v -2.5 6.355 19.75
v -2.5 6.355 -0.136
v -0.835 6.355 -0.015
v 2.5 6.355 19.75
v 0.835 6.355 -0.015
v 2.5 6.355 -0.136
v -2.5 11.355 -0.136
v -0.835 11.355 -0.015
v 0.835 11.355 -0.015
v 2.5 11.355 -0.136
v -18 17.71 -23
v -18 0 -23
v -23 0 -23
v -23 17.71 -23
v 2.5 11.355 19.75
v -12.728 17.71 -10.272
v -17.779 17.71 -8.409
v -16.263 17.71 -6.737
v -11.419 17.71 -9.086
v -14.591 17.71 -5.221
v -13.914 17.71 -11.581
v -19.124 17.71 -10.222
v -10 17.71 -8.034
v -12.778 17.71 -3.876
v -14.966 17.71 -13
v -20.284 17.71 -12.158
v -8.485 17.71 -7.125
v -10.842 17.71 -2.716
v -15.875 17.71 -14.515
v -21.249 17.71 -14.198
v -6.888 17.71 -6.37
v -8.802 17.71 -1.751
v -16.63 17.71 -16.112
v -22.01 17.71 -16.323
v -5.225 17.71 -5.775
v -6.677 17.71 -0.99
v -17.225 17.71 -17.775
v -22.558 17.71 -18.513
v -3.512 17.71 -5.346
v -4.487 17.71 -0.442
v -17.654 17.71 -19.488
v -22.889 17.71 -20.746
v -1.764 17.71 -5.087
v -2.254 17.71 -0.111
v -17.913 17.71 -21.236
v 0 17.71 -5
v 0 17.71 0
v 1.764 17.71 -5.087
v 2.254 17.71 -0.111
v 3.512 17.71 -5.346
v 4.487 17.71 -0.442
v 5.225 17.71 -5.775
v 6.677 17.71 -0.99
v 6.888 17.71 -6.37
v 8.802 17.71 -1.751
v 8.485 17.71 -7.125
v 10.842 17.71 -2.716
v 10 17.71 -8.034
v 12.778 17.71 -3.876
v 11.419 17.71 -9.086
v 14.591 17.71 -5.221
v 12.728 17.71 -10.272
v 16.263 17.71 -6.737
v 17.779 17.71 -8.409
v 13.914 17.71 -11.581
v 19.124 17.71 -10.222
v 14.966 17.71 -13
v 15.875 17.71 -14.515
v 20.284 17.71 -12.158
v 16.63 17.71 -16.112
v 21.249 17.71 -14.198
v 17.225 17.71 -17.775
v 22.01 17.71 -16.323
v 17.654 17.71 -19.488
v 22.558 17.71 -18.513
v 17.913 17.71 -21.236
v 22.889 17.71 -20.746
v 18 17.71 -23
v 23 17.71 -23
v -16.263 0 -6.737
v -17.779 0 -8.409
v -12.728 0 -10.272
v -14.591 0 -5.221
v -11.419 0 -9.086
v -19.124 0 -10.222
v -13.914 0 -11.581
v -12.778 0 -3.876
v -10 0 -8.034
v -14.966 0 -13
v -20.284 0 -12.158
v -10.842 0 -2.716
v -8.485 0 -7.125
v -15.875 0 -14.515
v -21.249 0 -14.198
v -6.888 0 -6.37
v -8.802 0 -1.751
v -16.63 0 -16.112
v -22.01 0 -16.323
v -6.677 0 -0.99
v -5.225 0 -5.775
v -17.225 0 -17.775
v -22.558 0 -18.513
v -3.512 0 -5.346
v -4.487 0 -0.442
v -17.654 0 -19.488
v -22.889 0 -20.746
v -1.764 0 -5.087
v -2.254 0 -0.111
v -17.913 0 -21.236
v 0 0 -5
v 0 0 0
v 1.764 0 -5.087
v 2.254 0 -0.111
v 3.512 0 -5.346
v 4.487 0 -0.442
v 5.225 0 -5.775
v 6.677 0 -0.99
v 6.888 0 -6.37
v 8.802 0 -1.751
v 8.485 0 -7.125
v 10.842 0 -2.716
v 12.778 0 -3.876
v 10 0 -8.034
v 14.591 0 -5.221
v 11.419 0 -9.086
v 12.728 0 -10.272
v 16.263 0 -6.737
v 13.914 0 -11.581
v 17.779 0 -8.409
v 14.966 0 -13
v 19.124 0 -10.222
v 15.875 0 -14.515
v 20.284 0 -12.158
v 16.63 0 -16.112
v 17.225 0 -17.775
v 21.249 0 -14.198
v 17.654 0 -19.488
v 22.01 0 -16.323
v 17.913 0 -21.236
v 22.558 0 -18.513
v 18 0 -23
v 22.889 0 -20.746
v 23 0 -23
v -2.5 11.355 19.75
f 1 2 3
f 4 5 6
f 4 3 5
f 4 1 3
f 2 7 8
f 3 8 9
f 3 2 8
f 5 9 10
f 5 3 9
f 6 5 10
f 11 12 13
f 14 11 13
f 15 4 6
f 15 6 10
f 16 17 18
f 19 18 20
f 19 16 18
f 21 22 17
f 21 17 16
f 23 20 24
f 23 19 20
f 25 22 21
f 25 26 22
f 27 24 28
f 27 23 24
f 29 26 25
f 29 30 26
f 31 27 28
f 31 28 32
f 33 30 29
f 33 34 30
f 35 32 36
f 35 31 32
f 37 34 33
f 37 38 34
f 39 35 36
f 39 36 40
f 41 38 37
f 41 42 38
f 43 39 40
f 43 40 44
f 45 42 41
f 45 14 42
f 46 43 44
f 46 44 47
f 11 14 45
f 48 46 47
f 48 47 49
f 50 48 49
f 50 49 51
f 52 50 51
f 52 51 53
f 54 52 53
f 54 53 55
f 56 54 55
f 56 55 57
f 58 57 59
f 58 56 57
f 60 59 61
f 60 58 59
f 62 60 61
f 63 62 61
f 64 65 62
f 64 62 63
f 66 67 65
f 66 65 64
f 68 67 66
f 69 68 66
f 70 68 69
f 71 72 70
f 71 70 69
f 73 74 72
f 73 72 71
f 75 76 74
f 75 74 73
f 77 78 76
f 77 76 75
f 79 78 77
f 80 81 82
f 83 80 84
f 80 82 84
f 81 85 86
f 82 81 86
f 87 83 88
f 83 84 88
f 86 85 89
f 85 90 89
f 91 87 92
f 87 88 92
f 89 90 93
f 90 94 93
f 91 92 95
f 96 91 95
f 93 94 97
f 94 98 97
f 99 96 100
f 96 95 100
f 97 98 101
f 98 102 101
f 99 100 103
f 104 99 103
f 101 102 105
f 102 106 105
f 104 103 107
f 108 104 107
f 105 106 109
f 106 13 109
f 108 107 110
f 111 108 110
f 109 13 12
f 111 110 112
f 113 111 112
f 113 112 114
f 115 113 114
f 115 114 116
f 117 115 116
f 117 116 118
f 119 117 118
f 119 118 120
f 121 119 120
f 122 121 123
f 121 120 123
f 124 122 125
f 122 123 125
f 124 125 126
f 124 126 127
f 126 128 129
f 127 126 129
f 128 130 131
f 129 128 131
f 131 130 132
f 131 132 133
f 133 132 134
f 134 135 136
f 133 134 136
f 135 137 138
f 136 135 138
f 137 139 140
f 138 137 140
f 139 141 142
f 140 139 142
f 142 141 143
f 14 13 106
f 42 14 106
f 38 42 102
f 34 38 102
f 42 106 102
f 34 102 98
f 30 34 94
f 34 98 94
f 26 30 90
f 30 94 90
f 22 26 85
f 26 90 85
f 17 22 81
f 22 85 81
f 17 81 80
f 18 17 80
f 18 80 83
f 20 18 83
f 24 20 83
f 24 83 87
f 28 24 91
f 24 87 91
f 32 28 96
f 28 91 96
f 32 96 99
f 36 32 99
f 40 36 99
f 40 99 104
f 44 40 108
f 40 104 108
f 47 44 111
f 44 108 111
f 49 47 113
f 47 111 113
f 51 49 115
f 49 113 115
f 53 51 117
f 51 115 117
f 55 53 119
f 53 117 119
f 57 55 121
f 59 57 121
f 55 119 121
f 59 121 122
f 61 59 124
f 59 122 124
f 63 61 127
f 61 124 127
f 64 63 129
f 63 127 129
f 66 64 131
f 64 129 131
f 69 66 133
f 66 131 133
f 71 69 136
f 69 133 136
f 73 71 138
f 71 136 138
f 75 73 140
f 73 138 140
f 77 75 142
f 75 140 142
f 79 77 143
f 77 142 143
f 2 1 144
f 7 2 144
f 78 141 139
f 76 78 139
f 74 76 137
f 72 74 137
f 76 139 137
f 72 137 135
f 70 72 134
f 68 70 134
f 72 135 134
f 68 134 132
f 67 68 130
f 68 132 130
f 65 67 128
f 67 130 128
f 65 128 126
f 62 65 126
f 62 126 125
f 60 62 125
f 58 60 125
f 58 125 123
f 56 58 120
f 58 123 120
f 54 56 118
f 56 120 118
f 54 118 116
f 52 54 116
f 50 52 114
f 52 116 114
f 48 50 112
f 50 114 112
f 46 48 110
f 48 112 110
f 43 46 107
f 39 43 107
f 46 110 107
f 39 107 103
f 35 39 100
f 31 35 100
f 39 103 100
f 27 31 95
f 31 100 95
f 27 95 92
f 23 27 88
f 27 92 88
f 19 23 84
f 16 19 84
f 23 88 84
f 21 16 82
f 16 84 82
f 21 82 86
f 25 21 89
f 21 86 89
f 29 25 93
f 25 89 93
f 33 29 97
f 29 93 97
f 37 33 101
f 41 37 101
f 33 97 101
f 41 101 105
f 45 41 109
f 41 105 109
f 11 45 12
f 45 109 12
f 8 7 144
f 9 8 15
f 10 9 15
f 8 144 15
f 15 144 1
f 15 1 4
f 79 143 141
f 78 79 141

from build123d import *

# Parameters (mm, degrees)
BOSS_EXTRUDE1_DEPTH             = 17.71
SKETCH2_W                       = 5
SKETCH2_H                       = 5
BOSS_EXTRUDE2_DEPTH             = 19.75
BOSS_EXTRUDE2_DIRECTION_2_REACH = 25


with BuildPart() as part:
    # Sketch1 → Boss-Extrude1 (new body)
    with BuildSketch(Plane(origin=(0, 0, 0), x_dir=(1, 0, 0), z_dir=(0, 1, 0))):
        with BuildLine():
            Line((23, 23), (18, 23))
            ThreePointArc((18, 23), (0, 5), (-18, 23))
            Line((-18, 23), (-23, 23))
            ThreePointArc((-23, 23), (0, 0), (23, 23))
        make_face()
    extrude(amount=BOSS_EXTRUDE1_DEPTH)


with BuildPart() as body_2:
    # Sketch2 → Boss-Extrude2 (new body)
    with BuildSketch(Plane.XY):
        with Locations((0, 8.855)):
            Rectangle(SKETCH2_W, SKETCH2_H)
    extrude(amount=BOSS_EXTRUDE2_DEPTH)


    # Sketch2 → Boss-Extrude2 direction 2 (add, up to next)
    with BuildSketch(Plane.XY, mode=Mode.PRIVATE) as boss_extrude2_direction_2_sk1:
        with Locations((0, 8.855)):
            Rectangle(SKETCH2_W, SKETCH2_H)
    boss_extrude2_direction_2_tool1 = extrude(boss_extrude2_direction_2_sk1.sketch, amount=-BOSS_EXTRUDE2_DIRECTION_2_REACH, mode=Mode.PRIVATE) - part.part
    add(boss_extrude2_direction_2_tool1.solids().sort_by_distance((0, 8.855, 0))[0])
    add(boss_extrude2_direction_2_tool1.solids().sort_by_distance((0, 8.855, 0))[1])


solid = Compound([part.part, body_2.part])
